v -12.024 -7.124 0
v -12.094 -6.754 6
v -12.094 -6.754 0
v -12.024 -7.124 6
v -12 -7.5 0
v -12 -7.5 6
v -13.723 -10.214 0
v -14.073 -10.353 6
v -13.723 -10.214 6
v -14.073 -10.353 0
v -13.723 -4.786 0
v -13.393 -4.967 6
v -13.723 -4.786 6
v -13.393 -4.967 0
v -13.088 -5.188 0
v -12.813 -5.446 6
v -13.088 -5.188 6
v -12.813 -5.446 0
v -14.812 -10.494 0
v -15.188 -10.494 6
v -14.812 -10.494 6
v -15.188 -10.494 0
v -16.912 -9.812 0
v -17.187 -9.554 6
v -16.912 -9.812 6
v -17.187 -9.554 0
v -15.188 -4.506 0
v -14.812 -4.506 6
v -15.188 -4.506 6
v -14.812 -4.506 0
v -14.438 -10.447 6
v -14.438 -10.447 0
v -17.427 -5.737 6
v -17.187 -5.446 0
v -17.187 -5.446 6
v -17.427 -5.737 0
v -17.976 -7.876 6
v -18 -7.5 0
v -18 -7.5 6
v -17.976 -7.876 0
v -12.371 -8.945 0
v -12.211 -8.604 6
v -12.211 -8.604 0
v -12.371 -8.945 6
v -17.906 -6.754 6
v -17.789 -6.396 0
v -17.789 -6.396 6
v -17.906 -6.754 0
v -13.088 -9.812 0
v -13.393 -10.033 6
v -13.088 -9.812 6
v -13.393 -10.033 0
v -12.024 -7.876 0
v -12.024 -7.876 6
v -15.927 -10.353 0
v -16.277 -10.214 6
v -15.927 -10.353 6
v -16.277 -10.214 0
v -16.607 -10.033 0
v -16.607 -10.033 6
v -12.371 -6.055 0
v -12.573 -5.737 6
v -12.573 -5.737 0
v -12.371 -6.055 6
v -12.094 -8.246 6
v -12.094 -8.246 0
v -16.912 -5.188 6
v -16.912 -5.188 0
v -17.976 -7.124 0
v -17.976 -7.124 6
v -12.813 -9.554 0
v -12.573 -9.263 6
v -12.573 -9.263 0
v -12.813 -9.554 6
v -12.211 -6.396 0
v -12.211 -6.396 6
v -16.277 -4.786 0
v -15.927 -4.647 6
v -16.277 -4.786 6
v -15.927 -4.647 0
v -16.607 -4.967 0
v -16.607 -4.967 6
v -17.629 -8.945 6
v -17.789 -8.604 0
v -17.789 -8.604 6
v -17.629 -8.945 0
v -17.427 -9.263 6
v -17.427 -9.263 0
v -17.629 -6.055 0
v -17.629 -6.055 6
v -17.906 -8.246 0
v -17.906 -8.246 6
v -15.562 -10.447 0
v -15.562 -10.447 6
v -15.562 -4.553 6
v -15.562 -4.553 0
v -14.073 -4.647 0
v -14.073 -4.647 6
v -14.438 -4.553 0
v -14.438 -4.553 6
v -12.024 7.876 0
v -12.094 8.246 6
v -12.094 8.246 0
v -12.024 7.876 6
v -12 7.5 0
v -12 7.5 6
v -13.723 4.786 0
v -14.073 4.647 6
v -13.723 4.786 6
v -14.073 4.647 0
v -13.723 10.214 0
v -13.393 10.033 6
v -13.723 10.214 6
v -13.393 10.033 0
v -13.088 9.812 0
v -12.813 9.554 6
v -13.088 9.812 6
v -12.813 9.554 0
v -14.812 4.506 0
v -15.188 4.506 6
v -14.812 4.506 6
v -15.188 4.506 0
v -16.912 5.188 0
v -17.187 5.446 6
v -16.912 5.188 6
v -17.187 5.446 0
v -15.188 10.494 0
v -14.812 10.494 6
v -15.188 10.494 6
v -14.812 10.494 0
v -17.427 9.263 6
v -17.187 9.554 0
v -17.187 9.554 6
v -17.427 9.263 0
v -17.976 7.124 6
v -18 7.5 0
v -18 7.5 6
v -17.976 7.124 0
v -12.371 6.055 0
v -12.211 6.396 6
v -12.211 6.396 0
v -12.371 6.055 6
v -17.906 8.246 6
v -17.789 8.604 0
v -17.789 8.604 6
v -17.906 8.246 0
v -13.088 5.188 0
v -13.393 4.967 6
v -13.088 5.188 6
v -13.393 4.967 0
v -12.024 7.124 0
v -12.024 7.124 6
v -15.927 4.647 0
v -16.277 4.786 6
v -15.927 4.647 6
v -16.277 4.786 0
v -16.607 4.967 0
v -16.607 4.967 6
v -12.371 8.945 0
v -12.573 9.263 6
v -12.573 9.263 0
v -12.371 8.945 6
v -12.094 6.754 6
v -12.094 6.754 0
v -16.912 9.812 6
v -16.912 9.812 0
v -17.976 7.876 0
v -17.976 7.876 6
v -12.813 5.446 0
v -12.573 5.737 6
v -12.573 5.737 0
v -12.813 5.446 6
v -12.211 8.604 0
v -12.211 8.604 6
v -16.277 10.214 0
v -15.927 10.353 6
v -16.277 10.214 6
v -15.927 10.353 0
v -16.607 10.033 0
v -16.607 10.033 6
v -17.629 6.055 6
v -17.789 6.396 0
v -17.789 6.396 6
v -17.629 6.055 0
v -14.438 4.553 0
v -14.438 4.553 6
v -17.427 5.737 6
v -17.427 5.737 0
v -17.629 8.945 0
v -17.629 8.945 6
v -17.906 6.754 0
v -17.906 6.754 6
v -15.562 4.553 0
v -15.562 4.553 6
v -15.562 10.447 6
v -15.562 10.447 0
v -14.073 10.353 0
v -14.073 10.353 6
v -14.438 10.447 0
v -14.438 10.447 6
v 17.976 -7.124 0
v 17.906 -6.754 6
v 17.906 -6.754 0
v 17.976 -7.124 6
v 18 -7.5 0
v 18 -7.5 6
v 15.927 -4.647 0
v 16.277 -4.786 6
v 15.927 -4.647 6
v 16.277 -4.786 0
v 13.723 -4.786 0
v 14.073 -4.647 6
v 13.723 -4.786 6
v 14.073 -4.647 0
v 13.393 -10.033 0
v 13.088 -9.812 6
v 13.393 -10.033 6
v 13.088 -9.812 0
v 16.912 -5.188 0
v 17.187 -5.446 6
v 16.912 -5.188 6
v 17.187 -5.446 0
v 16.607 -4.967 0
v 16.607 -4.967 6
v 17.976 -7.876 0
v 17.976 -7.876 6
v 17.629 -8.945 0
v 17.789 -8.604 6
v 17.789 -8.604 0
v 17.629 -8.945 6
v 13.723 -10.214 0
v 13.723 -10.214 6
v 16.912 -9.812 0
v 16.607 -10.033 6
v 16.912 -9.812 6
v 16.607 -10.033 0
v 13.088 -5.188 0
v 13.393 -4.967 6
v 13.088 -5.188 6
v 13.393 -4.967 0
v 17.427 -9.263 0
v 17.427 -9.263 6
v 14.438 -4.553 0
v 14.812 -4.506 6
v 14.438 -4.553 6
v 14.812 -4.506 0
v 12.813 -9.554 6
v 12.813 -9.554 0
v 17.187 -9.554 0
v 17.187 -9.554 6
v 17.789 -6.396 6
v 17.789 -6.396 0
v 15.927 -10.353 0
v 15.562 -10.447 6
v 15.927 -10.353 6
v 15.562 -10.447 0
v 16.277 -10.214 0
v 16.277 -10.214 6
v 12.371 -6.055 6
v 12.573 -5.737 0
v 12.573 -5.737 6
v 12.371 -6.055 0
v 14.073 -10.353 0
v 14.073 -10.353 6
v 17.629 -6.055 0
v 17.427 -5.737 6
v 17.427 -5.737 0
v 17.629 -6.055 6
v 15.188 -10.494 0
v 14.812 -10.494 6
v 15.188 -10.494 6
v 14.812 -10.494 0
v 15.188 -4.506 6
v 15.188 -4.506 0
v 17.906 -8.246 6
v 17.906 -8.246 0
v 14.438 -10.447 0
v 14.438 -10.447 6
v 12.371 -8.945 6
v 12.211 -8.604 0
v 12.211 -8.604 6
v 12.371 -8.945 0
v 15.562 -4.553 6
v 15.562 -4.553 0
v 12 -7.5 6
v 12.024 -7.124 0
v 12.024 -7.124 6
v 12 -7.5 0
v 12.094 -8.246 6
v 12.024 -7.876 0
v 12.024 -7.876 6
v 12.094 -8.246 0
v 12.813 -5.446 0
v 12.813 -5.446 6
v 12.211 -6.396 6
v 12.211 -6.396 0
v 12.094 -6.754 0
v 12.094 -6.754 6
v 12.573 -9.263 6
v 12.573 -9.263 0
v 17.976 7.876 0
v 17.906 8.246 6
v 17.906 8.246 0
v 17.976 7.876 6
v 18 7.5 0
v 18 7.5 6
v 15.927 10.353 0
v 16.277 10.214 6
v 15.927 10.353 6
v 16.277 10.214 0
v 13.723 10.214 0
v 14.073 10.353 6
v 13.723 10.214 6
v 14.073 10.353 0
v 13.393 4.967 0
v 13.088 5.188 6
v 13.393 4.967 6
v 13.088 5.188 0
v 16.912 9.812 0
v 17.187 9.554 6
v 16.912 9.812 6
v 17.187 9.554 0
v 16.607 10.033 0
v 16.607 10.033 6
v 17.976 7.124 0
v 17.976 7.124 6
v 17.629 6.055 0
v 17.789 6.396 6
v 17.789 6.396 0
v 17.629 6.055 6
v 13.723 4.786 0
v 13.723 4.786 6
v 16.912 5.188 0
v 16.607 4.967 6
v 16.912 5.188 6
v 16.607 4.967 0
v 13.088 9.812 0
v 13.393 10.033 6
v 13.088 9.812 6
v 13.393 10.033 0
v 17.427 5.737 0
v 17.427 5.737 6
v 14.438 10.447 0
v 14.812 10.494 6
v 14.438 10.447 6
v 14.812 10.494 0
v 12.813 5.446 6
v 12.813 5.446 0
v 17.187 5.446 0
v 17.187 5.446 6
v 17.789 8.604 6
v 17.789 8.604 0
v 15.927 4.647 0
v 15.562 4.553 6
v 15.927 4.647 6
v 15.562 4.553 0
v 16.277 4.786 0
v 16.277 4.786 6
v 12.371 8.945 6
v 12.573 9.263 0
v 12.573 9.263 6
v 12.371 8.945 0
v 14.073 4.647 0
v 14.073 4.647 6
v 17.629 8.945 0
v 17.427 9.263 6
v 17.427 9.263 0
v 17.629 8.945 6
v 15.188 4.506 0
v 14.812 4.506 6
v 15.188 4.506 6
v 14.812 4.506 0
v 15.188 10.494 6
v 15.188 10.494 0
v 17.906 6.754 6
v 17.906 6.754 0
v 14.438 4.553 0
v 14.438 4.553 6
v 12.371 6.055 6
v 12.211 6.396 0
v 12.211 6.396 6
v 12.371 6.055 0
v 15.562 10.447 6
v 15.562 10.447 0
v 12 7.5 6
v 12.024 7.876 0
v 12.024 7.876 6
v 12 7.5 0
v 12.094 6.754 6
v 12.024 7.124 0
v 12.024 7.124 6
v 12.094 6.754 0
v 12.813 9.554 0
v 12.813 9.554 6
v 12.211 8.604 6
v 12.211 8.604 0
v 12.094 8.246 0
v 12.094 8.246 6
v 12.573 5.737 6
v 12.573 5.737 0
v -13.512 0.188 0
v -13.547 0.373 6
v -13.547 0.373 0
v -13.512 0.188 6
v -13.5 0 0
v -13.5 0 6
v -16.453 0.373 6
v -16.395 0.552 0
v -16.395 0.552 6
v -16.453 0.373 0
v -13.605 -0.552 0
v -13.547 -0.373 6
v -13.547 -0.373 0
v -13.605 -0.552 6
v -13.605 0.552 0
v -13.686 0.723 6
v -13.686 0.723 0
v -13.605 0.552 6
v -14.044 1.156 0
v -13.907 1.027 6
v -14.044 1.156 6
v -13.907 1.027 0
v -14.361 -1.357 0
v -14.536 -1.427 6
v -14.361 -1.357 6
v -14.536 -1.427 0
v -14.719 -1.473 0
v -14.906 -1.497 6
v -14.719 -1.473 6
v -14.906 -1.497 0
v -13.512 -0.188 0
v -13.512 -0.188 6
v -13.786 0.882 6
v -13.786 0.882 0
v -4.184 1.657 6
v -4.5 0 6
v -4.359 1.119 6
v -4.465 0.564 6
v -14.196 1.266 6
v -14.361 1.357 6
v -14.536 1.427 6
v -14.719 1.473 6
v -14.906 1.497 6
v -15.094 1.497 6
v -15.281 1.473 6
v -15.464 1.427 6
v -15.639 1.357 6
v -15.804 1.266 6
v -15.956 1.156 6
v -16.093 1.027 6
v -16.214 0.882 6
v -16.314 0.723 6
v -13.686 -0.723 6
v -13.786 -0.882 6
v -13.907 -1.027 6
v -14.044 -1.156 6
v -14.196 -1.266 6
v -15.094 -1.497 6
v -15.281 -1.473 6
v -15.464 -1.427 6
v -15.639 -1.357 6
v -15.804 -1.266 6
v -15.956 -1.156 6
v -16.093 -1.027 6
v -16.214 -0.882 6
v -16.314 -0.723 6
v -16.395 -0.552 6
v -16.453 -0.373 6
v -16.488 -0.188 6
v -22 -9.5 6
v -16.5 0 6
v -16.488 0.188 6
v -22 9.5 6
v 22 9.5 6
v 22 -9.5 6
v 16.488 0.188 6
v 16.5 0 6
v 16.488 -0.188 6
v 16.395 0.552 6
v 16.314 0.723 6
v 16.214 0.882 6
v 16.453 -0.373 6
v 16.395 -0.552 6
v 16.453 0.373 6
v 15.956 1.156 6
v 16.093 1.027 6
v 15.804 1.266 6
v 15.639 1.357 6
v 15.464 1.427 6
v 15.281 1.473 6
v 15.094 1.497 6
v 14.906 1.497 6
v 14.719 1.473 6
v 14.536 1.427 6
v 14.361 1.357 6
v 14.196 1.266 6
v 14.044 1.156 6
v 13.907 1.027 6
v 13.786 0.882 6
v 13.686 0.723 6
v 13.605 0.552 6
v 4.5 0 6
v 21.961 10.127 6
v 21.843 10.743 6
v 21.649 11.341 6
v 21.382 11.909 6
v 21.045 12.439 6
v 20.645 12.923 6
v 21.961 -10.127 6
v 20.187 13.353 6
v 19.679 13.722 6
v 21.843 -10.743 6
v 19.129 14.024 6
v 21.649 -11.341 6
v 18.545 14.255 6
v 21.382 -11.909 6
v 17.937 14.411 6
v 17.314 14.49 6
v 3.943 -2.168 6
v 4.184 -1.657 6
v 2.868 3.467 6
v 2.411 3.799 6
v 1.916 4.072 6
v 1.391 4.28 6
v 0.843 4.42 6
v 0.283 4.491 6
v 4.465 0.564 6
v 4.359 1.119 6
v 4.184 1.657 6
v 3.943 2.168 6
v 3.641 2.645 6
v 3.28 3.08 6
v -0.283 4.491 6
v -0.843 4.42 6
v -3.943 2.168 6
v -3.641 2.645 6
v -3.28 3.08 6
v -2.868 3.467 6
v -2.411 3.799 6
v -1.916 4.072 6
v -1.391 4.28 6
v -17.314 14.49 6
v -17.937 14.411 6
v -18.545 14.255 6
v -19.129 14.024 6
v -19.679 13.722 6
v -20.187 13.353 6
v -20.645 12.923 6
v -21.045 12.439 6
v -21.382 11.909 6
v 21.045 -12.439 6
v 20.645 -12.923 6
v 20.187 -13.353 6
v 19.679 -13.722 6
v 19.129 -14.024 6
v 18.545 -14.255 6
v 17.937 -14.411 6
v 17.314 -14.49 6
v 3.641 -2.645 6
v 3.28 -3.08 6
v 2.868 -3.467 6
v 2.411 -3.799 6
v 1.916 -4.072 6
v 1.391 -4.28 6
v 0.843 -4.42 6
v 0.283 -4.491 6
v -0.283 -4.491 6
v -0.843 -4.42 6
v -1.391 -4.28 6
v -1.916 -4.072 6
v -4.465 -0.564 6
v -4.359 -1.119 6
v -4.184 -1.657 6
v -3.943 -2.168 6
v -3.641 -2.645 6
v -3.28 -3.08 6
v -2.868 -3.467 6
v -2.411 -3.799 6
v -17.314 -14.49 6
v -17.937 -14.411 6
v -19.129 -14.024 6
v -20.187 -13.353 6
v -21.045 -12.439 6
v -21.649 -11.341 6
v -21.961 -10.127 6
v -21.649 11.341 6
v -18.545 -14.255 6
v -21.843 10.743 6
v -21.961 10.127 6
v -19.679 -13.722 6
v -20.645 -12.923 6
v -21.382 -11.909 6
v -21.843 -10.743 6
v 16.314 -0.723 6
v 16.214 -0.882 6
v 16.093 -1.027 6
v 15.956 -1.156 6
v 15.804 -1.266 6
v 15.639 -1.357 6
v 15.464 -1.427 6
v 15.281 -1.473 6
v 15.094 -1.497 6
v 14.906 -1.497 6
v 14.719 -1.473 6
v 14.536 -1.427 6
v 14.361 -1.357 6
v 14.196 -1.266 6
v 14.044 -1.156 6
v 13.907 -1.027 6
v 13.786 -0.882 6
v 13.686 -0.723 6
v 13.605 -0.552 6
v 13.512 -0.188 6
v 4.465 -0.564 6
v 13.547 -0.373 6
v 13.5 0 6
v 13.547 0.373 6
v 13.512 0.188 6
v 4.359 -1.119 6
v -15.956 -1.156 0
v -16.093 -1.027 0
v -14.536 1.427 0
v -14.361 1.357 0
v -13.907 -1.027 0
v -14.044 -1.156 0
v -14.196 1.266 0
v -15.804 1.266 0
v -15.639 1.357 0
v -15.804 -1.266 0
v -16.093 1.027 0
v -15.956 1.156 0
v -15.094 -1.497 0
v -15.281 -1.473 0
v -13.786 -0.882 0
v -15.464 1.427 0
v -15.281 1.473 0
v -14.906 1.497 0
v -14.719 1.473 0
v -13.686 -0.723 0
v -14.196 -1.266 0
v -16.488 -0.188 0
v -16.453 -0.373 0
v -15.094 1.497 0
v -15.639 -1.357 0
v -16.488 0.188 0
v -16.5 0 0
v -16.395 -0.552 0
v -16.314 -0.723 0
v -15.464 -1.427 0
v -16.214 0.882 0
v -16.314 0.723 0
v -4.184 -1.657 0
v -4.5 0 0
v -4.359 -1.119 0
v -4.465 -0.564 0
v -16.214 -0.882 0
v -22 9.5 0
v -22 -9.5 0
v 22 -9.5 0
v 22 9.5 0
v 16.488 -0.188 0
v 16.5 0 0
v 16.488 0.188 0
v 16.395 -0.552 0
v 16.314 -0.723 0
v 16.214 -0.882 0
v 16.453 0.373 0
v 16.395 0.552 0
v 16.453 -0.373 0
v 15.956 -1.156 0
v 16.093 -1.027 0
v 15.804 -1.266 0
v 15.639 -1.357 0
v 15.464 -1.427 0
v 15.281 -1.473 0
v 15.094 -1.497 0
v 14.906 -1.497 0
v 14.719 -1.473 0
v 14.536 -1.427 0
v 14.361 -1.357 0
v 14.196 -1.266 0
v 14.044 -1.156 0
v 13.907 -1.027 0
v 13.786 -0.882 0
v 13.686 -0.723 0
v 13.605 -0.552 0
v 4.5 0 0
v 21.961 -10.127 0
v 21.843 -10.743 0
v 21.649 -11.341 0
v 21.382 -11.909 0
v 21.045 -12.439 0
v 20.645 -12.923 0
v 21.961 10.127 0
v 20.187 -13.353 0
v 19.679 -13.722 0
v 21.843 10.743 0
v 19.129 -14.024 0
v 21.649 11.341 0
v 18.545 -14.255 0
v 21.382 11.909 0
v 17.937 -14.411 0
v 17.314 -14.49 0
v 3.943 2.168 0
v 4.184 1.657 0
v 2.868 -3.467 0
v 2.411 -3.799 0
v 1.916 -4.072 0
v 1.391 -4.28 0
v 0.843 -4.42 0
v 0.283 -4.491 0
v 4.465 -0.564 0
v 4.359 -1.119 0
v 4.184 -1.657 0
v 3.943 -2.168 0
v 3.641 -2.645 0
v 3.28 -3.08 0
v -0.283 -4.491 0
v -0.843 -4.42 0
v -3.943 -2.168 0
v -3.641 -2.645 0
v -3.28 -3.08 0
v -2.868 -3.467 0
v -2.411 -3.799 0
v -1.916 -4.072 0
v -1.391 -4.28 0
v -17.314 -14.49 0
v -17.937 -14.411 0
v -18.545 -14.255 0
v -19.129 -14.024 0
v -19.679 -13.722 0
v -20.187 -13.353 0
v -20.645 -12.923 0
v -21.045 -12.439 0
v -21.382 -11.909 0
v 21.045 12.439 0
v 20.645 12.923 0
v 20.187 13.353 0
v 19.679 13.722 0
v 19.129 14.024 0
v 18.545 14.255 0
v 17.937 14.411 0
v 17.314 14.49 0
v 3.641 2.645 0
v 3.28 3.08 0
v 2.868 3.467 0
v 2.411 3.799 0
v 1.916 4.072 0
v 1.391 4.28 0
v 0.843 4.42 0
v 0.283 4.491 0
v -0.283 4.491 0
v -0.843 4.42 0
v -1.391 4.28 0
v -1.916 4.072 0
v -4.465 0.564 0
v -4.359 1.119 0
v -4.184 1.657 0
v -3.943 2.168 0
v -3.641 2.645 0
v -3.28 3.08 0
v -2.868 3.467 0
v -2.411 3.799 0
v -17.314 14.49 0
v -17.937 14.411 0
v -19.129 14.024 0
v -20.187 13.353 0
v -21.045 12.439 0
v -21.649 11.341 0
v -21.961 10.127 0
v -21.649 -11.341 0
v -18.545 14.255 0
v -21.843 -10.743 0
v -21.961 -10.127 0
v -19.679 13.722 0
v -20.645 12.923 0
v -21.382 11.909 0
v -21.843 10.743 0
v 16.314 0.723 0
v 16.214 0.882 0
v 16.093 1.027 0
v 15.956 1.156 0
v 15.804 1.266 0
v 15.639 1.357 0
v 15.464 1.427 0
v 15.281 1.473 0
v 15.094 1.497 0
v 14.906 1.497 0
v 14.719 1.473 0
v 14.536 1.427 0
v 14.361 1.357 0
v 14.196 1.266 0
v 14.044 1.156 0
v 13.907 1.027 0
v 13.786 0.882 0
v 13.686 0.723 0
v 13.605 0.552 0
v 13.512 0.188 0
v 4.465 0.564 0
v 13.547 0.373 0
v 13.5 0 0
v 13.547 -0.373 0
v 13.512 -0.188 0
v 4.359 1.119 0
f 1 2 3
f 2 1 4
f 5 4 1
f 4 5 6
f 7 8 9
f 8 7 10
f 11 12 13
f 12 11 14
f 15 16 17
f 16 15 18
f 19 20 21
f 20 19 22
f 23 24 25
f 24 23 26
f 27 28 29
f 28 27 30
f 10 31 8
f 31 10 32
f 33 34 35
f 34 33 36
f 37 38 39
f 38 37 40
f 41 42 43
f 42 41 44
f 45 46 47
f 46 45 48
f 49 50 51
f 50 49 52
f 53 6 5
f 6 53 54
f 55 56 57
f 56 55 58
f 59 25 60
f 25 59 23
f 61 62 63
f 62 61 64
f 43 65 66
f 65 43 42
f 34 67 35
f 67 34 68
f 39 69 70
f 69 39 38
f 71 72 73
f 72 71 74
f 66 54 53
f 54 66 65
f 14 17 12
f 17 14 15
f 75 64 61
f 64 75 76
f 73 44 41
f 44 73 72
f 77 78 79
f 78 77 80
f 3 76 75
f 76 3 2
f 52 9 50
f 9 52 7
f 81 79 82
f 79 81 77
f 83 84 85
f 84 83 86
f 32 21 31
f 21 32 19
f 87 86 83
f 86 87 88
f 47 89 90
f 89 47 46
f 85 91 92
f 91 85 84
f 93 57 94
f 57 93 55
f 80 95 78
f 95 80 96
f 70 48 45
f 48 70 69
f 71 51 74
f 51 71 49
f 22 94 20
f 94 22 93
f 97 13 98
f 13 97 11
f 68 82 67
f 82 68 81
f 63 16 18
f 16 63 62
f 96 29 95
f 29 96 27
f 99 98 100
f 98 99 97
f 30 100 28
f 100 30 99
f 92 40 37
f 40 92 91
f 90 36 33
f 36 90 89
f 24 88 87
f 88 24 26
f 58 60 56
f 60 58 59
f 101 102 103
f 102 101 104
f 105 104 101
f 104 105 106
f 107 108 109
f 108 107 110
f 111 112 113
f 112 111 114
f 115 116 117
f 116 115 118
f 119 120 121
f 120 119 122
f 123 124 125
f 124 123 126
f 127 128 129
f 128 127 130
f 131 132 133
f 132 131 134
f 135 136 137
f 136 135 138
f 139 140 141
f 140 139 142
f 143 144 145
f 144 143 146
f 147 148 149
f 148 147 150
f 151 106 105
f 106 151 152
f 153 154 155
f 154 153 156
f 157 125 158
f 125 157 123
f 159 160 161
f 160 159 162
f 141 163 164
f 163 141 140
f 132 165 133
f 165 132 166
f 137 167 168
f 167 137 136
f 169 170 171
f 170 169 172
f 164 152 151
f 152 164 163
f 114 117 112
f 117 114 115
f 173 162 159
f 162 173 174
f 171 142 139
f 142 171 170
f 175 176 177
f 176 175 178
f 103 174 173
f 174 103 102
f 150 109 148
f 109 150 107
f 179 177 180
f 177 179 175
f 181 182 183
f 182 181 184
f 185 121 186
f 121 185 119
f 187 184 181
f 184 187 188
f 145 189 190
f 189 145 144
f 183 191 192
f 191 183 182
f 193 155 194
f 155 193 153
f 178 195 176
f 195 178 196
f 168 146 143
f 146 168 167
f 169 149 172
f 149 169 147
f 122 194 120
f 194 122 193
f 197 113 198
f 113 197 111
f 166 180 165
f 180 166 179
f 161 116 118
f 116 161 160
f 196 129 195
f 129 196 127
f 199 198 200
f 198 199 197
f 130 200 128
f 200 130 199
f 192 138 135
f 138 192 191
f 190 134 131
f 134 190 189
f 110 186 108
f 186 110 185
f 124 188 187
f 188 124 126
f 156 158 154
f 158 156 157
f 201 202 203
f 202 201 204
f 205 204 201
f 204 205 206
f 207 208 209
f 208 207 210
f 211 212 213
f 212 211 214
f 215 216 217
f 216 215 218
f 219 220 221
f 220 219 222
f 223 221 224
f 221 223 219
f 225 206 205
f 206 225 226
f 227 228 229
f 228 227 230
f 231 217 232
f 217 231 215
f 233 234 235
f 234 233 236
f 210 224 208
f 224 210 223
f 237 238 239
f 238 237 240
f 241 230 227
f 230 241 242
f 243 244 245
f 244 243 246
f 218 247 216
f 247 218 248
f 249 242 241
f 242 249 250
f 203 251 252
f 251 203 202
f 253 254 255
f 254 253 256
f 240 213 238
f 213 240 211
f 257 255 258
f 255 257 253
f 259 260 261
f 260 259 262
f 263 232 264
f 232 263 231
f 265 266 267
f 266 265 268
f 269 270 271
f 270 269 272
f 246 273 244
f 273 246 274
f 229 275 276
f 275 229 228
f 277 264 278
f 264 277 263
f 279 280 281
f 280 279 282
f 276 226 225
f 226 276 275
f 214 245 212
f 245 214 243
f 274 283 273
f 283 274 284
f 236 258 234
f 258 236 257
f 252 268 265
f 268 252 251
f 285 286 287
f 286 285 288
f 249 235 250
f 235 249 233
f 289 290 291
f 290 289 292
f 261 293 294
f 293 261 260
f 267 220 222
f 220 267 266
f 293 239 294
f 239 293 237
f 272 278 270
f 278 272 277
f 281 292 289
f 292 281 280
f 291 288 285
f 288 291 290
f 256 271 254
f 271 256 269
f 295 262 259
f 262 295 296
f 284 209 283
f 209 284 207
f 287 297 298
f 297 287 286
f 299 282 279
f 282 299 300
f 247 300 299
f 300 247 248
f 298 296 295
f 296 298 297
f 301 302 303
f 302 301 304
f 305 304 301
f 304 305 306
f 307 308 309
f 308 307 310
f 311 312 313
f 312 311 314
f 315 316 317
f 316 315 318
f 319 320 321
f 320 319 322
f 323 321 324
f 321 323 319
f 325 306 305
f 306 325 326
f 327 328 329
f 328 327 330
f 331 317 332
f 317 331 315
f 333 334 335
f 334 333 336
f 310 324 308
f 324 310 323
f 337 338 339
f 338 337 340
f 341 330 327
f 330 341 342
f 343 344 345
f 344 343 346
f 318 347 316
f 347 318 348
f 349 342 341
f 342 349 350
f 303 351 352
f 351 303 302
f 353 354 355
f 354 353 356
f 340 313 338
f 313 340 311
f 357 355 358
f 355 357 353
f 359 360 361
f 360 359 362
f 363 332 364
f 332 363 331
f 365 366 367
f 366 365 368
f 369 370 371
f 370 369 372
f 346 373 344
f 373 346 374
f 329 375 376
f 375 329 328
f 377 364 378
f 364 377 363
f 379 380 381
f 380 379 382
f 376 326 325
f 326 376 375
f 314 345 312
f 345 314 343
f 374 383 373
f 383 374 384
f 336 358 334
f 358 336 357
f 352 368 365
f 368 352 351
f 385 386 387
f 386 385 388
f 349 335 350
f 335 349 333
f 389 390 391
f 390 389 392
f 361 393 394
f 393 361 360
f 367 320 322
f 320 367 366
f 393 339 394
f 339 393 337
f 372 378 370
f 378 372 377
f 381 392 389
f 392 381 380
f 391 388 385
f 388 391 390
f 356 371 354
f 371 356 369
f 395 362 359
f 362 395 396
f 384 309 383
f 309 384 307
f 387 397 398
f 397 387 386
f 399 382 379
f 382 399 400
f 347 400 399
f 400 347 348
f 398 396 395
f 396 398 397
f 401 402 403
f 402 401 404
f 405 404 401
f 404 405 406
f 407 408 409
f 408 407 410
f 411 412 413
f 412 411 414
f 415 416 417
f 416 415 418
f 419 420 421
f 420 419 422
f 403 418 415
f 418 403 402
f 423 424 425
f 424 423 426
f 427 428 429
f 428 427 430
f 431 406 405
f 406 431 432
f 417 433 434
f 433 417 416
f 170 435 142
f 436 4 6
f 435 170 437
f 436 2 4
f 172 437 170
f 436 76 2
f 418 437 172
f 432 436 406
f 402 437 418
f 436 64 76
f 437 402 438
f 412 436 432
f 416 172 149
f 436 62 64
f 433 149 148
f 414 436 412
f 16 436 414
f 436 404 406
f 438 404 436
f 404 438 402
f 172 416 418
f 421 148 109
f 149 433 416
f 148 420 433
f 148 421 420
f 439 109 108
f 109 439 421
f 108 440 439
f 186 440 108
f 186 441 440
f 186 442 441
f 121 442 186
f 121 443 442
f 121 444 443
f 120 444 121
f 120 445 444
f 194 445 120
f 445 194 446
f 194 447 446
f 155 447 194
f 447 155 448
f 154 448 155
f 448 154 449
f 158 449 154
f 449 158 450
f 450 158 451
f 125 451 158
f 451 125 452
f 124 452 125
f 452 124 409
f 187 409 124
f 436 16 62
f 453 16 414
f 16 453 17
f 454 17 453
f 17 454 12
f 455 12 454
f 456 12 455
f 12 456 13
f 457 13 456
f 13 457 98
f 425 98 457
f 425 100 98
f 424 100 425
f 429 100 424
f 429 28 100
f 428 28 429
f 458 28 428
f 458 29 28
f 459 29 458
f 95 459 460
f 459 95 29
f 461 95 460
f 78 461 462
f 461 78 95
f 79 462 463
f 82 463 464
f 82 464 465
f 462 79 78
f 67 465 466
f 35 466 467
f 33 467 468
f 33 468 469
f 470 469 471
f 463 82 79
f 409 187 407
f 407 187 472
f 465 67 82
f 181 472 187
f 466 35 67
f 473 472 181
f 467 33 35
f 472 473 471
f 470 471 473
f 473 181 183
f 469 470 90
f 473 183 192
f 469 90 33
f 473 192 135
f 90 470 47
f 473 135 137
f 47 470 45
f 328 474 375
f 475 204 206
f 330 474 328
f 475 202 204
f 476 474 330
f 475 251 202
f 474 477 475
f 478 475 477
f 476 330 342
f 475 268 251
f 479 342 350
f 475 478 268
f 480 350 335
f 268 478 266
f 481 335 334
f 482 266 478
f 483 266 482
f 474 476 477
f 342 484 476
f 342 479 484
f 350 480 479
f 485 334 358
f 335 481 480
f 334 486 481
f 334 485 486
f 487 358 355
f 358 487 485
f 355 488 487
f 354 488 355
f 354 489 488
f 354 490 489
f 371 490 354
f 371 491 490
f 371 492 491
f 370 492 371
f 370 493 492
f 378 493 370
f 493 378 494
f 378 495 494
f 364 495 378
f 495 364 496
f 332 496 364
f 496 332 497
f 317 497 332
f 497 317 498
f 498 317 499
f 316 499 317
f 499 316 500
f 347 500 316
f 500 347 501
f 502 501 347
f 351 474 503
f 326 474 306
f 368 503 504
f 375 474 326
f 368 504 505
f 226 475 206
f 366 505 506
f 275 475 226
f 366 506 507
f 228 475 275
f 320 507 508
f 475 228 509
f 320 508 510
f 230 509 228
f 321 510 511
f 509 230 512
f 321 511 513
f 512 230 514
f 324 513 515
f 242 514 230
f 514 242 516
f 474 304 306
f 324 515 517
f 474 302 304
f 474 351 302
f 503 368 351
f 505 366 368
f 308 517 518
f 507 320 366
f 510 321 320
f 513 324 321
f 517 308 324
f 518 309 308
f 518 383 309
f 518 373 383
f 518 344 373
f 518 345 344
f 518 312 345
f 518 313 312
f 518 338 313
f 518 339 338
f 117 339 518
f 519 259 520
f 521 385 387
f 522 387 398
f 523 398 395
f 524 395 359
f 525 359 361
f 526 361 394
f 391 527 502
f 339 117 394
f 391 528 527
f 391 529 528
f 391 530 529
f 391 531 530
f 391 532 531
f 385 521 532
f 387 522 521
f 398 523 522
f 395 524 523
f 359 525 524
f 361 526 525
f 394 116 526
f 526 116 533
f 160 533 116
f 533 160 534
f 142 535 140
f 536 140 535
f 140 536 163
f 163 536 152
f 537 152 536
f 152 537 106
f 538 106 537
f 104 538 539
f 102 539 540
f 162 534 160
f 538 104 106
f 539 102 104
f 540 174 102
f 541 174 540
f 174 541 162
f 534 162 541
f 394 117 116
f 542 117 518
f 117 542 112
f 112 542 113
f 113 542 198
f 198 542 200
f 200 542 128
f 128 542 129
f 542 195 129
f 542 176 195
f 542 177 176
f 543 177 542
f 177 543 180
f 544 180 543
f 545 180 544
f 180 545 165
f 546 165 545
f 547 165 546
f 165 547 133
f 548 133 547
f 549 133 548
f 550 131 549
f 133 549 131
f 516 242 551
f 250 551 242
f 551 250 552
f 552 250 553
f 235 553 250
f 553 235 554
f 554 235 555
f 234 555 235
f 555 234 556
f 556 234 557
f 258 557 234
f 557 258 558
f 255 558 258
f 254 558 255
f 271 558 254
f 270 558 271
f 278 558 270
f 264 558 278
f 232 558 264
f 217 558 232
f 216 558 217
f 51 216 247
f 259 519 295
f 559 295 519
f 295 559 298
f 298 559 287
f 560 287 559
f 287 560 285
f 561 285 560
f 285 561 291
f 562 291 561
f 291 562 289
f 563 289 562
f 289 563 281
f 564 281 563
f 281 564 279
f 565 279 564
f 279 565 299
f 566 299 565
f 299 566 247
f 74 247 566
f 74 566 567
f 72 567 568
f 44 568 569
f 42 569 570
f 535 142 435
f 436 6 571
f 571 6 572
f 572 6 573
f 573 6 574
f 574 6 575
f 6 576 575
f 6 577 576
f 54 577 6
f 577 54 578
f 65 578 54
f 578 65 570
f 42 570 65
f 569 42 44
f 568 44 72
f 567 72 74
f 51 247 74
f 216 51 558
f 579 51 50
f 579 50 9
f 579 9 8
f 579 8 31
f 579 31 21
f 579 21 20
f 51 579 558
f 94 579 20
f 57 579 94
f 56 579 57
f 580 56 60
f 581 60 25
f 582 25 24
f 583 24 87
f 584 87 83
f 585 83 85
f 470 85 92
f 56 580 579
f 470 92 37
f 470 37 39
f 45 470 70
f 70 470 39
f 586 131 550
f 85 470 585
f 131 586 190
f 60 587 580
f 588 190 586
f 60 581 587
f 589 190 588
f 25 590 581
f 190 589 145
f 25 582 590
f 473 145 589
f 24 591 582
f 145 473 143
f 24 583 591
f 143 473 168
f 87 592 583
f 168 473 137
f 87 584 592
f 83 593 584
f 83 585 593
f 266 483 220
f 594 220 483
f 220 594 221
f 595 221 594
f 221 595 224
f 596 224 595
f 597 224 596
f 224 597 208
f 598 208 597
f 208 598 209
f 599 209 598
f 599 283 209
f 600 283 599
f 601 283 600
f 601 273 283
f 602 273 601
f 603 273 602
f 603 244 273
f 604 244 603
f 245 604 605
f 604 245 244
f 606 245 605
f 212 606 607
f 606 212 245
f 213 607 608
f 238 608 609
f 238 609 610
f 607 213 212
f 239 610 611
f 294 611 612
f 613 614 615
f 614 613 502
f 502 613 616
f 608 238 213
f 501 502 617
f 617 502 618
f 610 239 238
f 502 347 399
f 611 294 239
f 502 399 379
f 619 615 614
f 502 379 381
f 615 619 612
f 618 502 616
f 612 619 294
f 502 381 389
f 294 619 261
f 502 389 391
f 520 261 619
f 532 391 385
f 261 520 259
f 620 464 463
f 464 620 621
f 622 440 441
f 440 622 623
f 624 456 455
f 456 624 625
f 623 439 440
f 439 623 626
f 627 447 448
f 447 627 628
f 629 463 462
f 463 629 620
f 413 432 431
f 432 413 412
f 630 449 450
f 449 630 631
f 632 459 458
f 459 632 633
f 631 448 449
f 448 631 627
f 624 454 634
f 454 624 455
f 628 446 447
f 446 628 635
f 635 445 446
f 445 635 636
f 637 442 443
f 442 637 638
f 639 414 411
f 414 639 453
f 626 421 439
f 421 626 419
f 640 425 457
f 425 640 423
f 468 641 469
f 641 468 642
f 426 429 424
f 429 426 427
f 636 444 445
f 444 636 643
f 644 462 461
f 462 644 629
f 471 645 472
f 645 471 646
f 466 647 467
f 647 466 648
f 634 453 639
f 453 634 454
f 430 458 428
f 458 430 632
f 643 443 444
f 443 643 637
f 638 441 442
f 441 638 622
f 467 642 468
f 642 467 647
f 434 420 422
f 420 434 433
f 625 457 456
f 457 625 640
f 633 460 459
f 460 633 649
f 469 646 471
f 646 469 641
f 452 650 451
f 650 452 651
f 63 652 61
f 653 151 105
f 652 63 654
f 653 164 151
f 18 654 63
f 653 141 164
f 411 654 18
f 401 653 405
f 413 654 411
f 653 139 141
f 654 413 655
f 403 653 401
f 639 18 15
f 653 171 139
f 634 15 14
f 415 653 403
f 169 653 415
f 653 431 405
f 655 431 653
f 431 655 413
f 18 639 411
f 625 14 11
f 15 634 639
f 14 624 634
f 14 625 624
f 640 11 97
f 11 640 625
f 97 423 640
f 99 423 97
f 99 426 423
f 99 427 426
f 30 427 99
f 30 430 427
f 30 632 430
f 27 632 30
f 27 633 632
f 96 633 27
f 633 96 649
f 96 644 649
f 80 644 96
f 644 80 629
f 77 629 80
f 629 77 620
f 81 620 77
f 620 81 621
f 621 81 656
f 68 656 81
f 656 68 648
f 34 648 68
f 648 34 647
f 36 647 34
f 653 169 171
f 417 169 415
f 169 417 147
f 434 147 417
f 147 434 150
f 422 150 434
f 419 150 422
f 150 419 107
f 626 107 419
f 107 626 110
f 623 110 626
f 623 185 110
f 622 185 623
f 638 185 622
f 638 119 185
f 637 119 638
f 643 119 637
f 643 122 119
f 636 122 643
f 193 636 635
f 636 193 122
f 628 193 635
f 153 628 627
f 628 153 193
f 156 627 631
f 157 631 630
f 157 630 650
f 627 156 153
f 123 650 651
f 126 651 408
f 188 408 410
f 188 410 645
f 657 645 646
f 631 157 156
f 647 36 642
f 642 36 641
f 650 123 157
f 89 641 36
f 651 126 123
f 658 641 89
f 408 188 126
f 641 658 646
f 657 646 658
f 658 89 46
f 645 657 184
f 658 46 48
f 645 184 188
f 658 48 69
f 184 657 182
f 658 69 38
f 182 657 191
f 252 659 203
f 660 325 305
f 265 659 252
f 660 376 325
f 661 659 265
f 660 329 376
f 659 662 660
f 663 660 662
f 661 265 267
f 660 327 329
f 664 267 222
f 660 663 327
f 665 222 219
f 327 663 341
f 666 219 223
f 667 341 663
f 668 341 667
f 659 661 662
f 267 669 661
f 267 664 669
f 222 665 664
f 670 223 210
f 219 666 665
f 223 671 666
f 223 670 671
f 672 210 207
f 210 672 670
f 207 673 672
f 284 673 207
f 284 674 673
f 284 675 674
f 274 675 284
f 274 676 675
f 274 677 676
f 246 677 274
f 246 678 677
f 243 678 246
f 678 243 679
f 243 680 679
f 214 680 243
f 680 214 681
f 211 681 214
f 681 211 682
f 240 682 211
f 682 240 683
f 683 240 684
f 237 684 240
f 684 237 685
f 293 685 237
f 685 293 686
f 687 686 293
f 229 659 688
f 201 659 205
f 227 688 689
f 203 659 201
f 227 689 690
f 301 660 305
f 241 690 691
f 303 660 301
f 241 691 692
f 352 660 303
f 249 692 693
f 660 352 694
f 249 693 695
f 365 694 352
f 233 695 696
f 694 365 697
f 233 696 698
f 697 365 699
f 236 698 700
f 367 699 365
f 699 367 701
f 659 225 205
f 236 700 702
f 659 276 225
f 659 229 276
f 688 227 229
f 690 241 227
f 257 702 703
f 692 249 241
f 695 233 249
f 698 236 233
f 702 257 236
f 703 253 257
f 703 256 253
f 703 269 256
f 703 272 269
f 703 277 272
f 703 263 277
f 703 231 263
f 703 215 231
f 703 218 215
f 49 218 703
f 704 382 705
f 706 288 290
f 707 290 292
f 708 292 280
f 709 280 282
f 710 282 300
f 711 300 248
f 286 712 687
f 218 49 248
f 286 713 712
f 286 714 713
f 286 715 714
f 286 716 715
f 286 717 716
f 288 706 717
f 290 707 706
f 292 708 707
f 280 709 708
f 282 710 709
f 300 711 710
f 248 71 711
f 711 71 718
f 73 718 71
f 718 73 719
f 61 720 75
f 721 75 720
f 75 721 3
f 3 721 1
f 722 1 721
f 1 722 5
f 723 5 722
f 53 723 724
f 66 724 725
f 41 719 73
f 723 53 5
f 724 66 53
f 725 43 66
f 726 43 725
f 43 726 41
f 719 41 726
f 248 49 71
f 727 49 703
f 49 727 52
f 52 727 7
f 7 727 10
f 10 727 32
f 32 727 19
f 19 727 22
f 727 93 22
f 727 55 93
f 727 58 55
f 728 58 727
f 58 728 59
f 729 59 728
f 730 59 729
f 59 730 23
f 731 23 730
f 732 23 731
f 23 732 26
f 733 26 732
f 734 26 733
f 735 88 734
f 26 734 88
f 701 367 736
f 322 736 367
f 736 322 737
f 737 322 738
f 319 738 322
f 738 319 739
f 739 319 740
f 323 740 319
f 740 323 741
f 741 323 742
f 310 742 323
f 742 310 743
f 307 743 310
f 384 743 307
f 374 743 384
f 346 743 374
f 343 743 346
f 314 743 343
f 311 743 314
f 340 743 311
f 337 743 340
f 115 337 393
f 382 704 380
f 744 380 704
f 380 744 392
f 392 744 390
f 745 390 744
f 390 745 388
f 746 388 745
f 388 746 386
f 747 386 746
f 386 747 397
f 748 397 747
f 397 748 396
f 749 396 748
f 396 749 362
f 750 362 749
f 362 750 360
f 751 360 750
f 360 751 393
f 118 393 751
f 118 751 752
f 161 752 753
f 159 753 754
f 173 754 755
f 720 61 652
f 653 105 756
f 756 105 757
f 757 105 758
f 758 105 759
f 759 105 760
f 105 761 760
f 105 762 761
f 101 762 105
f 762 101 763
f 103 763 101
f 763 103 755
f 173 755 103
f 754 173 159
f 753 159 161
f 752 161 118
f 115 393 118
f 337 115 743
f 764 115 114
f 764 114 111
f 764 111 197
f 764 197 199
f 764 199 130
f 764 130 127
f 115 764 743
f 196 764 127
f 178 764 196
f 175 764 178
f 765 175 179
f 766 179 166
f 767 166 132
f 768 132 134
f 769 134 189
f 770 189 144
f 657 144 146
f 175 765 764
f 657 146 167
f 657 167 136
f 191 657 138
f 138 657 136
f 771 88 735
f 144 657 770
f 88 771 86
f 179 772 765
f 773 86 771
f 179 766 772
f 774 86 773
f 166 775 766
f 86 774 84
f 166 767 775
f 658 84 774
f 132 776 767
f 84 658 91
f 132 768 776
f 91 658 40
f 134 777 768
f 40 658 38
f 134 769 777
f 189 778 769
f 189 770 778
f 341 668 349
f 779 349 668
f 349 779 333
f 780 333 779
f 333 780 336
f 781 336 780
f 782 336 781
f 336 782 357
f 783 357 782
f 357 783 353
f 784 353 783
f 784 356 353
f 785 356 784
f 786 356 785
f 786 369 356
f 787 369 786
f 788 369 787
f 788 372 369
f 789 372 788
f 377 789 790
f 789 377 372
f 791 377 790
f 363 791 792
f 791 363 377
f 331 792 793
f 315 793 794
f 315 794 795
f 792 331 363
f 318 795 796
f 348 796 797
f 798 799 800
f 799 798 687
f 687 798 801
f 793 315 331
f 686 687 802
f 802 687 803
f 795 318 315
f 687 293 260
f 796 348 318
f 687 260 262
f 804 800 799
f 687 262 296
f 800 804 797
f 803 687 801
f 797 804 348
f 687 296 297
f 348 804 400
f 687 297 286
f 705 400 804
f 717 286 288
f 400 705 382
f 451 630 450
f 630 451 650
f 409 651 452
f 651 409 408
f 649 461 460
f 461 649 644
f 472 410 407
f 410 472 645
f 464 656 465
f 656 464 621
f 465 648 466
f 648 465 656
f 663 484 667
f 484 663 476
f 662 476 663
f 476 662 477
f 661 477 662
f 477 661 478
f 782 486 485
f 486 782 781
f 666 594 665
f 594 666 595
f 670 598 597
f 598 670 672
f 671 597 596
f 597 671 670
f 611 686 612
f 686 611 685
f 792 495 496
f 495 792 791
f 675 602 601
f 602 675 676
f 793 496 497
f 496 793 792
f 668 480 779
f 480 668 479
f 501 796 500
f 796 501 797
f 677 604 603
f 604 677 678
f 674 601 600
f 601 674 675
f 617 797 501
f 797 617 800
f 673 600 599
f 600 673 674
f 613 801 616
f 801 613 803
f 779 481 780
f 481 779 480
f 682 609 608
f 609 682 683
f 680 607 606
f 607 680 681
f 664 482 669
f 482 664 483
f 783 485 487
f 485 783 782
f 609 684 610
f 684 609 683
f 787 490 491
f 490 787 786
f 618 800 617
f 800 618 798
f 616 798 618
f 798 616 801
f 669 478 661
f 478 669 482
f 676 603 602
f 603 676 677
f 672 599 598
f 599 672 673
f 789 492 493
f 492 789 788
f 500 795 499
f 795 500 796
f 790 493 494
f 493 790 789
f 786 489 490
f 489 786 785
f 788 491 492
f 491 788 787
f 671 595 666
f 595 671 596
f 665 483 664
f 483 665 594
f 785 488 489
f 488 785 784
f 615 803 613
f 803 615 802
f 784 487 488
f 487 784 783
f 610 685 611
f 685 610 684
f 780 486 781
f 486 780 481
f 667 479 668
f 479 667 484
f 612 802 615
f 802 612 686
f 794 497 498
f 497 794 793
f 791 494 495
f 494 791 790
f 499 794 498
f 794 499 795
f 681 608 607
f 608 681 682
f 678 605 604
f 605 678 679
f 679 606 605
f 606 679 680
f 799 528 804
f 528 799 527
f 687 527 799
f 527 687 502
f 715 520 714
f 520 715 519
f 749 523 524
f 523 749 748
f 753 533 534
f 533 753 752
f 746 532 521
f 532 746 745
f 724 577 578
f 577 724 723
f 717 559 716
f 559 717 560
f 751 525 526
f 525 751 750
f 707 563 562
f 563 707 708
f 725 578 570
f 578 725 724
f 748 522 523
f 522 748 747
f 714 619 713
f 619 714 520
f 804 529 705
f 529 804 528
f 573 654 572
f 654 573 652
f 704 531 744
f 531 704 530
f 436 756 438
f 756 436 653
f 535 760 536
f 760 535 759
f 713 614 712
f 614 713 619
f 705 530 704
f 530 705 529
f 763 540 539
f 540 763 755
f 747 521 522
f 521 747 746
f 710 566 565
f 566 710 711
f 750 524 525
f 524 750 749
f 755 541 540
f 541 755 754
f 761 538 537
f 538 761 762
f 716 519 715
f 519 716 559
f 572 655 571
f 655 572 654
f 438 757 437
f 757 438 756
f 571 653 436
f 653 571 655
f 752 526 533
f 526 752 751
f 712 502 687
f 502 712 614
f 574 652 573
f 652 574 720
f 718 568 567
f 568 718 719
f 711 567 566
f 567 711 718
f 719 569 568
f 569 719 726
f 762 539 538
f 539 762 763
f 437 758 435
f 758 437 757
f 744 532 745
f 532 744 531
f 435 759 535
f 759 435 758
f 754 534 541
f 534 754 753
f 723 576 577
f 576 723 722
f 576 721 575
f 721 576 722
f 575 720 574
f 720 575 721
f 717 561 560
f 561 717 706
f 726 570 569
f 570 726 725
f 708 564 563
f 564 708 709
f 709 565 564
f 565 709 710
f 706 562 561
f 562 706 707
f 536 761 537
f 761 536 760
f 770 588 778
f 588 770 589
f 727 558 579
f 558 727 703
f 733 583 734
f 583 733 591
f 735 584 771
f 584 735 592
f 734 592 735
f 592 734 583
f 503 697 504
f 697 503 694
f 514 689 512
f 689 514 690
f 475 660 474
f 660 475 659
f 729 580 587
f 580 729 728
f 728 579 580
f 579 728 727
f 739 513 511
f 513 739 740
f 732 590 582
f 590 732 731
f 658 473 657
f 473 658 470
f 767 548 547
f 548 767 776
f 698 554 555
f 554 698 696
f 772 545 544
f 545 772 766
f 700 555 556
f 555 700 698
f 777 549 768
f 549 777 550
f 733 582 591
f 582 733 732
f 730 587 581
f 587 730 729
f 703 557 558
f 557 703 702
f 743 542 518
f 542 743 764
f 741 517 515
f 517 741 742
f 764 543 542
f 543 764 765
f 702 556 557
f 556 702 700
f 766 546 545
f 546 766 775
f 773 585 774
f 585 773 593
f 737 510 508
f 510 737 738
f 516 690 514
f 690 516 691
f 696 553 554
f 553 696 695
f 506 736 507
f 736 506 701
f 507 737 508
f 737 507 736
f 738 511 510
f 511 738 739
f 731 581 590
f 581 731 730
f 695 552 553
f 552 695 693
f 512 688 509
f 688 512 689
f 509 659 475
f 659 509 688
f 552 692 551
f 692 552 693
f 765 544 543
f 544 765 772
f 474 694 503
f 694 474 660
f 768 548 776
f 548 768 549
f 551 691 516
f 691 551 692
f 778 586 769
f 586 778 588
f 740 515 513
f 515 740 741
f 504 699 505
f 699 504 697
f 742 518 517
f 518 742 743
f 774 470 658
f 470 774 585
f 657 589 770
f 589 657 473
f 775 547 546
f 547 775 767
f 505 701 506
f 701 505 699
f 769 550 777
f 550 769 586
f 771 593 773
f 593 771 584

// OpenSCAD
$fn = 50;


difference() {
	union() {
		hull() {
			translate(v = [-17.0000000000, 9.5000000000, 0]) {
				cylinder(h = 6, r = 5);
			}
			translate(v = [17.0000000000, 9.5000000000, 0]) {
				cylinder(h = 6, r = 5);
			}
			translate(v = [-17.0000000000, -9.5000000000, 0]) {
				cylinder(h = 6, r = 5);
			}
			translate(v = [17.0000000000, -9.5000000000, 0]) {
				cylinder(h = 6, r = 5);
			}
		}
	}
	union() {
		#translate(v = [-15.0000000000, -7.5000000000, 0]) {
			cylinder(h = 6, r = 3.0000000000);
		}
		#translate(v = [-15.0000000000, 7.5000000000, 0]) {
			cylinder(h = 6, r = 3.0000000000);
		}
		#translate(v = [15.0000000000, -7.5000000000, 0]) {
			cylinder(h = 6, r = 3.0000000000);
		}
		#translate(v = [15.0000000000, 7.5000000000, 0]) {
			cylinder(h = 6, r = 3.0000000000);
		}
		#translate(v = [-15.0000000000, -7.5000000000, -100.0000000000]) {
			cylinder(h = 200, r = 3.0000000000);
		}
		#translate(v = [-15.0000000000, 7.5000000000, -100.0000000000]) {
			cylinder(h = 200, r = 3.0000000000);
		}
		#translate(v = [15.0000000000, -7.5000000000, -100.0000000000]) {
			cylinder(h = 200, r = 3.0000000000);
		}
		#translate(v = [15.0000000000, 7.5000000000, -100.0000000000]) {
			cylinder(h = 200, r = 3.0000000000);
		}
		#translate(v = [-15.0000000000, -7.5000000000, 0]) {
			cylinder(h = 6, r = 1.5000000000);
		}
		#translate(v = [-15.0000000000, 0.0000000000, 0]) {
			cylinder(h = 6, r = 1.5000000000);
		}
		#translate(v = [-15.0000000000, 7.5000000000, 0]) {
			cylinder(h = 6, r = 1.5000000000);
		}
		#translate(v = [15.0000000000, -7.5000000000, 0]) {
			cylinder(h = 6, r = 1.5000000000);
		}
		#translate(v = [15.0000000000, 0.0000000000, 0]) {
			cylinder(h = 6, r = 1.5000000000);
		}
		#translate(v = [15.0000000000, 7.5000000000, 0]) {
			cylinder(h = 6, r = 1.5000000000);
		}
		#translate(v = [-15.0000000000, -7.5000000000, 0]) {
			cylinder(h = 6, r = 1.5000000000);
		}
		#translate(v = [-15.0000000000, 0.0000000000, 0]) {
			cylinder(h = 6, r = 1.5000000000);
		}
		#translate(v = [-15.0000000000, 7.5000000000, 0]) {
			cylinder(h = 6, r = 1.5000000000);
		}
		#translate(v = [15.0000000000, -7.5000000000, 0]) {
			cylinder(h = 6, r = 1.5000000000);
		}
		#translate(v = [15.0000000000, 0.0000000000, 0]) {
			cylinder(h = 6, r = 1.5000000000);
		}
		#translate(v = [15.0000000000, 7.5000000000, 0]) {
			cylinder(h = 6, r = 1.5000000000);
		}
		#translate(v = [-15.0000000000, -7.5000000000, 0]) {
			cylinder(h = 6, r = 1.5000000000);
		}
		#translate(v = [-15.0000000000, 0.0000000000, 0]) {
			cylinder(h = 6, r = 1.5000000000);
		}
		#translate(v = [-15.0000000000, 7.5000000000, 0]) {
			cylinder(h = 6, r = 1.5000000000);
		}
		#translate(v = [15.0000000000, -7.5000000000, 0]) {
			cylinder(h = 6, r = 1.5000000000);
		}
		#translate(v = [15.0000000000, 0.0000000000, 0]) {
			cylinder(h = 6, r = 1.5000000000);
		}
		#translate(v = [15.0000000000, 7.5000000000, 0]) {
			cylinder(h = 6, r = 1.5000000000);
		}
		#cylinder(h = 6, r = 4.5000000000);
	}
}
